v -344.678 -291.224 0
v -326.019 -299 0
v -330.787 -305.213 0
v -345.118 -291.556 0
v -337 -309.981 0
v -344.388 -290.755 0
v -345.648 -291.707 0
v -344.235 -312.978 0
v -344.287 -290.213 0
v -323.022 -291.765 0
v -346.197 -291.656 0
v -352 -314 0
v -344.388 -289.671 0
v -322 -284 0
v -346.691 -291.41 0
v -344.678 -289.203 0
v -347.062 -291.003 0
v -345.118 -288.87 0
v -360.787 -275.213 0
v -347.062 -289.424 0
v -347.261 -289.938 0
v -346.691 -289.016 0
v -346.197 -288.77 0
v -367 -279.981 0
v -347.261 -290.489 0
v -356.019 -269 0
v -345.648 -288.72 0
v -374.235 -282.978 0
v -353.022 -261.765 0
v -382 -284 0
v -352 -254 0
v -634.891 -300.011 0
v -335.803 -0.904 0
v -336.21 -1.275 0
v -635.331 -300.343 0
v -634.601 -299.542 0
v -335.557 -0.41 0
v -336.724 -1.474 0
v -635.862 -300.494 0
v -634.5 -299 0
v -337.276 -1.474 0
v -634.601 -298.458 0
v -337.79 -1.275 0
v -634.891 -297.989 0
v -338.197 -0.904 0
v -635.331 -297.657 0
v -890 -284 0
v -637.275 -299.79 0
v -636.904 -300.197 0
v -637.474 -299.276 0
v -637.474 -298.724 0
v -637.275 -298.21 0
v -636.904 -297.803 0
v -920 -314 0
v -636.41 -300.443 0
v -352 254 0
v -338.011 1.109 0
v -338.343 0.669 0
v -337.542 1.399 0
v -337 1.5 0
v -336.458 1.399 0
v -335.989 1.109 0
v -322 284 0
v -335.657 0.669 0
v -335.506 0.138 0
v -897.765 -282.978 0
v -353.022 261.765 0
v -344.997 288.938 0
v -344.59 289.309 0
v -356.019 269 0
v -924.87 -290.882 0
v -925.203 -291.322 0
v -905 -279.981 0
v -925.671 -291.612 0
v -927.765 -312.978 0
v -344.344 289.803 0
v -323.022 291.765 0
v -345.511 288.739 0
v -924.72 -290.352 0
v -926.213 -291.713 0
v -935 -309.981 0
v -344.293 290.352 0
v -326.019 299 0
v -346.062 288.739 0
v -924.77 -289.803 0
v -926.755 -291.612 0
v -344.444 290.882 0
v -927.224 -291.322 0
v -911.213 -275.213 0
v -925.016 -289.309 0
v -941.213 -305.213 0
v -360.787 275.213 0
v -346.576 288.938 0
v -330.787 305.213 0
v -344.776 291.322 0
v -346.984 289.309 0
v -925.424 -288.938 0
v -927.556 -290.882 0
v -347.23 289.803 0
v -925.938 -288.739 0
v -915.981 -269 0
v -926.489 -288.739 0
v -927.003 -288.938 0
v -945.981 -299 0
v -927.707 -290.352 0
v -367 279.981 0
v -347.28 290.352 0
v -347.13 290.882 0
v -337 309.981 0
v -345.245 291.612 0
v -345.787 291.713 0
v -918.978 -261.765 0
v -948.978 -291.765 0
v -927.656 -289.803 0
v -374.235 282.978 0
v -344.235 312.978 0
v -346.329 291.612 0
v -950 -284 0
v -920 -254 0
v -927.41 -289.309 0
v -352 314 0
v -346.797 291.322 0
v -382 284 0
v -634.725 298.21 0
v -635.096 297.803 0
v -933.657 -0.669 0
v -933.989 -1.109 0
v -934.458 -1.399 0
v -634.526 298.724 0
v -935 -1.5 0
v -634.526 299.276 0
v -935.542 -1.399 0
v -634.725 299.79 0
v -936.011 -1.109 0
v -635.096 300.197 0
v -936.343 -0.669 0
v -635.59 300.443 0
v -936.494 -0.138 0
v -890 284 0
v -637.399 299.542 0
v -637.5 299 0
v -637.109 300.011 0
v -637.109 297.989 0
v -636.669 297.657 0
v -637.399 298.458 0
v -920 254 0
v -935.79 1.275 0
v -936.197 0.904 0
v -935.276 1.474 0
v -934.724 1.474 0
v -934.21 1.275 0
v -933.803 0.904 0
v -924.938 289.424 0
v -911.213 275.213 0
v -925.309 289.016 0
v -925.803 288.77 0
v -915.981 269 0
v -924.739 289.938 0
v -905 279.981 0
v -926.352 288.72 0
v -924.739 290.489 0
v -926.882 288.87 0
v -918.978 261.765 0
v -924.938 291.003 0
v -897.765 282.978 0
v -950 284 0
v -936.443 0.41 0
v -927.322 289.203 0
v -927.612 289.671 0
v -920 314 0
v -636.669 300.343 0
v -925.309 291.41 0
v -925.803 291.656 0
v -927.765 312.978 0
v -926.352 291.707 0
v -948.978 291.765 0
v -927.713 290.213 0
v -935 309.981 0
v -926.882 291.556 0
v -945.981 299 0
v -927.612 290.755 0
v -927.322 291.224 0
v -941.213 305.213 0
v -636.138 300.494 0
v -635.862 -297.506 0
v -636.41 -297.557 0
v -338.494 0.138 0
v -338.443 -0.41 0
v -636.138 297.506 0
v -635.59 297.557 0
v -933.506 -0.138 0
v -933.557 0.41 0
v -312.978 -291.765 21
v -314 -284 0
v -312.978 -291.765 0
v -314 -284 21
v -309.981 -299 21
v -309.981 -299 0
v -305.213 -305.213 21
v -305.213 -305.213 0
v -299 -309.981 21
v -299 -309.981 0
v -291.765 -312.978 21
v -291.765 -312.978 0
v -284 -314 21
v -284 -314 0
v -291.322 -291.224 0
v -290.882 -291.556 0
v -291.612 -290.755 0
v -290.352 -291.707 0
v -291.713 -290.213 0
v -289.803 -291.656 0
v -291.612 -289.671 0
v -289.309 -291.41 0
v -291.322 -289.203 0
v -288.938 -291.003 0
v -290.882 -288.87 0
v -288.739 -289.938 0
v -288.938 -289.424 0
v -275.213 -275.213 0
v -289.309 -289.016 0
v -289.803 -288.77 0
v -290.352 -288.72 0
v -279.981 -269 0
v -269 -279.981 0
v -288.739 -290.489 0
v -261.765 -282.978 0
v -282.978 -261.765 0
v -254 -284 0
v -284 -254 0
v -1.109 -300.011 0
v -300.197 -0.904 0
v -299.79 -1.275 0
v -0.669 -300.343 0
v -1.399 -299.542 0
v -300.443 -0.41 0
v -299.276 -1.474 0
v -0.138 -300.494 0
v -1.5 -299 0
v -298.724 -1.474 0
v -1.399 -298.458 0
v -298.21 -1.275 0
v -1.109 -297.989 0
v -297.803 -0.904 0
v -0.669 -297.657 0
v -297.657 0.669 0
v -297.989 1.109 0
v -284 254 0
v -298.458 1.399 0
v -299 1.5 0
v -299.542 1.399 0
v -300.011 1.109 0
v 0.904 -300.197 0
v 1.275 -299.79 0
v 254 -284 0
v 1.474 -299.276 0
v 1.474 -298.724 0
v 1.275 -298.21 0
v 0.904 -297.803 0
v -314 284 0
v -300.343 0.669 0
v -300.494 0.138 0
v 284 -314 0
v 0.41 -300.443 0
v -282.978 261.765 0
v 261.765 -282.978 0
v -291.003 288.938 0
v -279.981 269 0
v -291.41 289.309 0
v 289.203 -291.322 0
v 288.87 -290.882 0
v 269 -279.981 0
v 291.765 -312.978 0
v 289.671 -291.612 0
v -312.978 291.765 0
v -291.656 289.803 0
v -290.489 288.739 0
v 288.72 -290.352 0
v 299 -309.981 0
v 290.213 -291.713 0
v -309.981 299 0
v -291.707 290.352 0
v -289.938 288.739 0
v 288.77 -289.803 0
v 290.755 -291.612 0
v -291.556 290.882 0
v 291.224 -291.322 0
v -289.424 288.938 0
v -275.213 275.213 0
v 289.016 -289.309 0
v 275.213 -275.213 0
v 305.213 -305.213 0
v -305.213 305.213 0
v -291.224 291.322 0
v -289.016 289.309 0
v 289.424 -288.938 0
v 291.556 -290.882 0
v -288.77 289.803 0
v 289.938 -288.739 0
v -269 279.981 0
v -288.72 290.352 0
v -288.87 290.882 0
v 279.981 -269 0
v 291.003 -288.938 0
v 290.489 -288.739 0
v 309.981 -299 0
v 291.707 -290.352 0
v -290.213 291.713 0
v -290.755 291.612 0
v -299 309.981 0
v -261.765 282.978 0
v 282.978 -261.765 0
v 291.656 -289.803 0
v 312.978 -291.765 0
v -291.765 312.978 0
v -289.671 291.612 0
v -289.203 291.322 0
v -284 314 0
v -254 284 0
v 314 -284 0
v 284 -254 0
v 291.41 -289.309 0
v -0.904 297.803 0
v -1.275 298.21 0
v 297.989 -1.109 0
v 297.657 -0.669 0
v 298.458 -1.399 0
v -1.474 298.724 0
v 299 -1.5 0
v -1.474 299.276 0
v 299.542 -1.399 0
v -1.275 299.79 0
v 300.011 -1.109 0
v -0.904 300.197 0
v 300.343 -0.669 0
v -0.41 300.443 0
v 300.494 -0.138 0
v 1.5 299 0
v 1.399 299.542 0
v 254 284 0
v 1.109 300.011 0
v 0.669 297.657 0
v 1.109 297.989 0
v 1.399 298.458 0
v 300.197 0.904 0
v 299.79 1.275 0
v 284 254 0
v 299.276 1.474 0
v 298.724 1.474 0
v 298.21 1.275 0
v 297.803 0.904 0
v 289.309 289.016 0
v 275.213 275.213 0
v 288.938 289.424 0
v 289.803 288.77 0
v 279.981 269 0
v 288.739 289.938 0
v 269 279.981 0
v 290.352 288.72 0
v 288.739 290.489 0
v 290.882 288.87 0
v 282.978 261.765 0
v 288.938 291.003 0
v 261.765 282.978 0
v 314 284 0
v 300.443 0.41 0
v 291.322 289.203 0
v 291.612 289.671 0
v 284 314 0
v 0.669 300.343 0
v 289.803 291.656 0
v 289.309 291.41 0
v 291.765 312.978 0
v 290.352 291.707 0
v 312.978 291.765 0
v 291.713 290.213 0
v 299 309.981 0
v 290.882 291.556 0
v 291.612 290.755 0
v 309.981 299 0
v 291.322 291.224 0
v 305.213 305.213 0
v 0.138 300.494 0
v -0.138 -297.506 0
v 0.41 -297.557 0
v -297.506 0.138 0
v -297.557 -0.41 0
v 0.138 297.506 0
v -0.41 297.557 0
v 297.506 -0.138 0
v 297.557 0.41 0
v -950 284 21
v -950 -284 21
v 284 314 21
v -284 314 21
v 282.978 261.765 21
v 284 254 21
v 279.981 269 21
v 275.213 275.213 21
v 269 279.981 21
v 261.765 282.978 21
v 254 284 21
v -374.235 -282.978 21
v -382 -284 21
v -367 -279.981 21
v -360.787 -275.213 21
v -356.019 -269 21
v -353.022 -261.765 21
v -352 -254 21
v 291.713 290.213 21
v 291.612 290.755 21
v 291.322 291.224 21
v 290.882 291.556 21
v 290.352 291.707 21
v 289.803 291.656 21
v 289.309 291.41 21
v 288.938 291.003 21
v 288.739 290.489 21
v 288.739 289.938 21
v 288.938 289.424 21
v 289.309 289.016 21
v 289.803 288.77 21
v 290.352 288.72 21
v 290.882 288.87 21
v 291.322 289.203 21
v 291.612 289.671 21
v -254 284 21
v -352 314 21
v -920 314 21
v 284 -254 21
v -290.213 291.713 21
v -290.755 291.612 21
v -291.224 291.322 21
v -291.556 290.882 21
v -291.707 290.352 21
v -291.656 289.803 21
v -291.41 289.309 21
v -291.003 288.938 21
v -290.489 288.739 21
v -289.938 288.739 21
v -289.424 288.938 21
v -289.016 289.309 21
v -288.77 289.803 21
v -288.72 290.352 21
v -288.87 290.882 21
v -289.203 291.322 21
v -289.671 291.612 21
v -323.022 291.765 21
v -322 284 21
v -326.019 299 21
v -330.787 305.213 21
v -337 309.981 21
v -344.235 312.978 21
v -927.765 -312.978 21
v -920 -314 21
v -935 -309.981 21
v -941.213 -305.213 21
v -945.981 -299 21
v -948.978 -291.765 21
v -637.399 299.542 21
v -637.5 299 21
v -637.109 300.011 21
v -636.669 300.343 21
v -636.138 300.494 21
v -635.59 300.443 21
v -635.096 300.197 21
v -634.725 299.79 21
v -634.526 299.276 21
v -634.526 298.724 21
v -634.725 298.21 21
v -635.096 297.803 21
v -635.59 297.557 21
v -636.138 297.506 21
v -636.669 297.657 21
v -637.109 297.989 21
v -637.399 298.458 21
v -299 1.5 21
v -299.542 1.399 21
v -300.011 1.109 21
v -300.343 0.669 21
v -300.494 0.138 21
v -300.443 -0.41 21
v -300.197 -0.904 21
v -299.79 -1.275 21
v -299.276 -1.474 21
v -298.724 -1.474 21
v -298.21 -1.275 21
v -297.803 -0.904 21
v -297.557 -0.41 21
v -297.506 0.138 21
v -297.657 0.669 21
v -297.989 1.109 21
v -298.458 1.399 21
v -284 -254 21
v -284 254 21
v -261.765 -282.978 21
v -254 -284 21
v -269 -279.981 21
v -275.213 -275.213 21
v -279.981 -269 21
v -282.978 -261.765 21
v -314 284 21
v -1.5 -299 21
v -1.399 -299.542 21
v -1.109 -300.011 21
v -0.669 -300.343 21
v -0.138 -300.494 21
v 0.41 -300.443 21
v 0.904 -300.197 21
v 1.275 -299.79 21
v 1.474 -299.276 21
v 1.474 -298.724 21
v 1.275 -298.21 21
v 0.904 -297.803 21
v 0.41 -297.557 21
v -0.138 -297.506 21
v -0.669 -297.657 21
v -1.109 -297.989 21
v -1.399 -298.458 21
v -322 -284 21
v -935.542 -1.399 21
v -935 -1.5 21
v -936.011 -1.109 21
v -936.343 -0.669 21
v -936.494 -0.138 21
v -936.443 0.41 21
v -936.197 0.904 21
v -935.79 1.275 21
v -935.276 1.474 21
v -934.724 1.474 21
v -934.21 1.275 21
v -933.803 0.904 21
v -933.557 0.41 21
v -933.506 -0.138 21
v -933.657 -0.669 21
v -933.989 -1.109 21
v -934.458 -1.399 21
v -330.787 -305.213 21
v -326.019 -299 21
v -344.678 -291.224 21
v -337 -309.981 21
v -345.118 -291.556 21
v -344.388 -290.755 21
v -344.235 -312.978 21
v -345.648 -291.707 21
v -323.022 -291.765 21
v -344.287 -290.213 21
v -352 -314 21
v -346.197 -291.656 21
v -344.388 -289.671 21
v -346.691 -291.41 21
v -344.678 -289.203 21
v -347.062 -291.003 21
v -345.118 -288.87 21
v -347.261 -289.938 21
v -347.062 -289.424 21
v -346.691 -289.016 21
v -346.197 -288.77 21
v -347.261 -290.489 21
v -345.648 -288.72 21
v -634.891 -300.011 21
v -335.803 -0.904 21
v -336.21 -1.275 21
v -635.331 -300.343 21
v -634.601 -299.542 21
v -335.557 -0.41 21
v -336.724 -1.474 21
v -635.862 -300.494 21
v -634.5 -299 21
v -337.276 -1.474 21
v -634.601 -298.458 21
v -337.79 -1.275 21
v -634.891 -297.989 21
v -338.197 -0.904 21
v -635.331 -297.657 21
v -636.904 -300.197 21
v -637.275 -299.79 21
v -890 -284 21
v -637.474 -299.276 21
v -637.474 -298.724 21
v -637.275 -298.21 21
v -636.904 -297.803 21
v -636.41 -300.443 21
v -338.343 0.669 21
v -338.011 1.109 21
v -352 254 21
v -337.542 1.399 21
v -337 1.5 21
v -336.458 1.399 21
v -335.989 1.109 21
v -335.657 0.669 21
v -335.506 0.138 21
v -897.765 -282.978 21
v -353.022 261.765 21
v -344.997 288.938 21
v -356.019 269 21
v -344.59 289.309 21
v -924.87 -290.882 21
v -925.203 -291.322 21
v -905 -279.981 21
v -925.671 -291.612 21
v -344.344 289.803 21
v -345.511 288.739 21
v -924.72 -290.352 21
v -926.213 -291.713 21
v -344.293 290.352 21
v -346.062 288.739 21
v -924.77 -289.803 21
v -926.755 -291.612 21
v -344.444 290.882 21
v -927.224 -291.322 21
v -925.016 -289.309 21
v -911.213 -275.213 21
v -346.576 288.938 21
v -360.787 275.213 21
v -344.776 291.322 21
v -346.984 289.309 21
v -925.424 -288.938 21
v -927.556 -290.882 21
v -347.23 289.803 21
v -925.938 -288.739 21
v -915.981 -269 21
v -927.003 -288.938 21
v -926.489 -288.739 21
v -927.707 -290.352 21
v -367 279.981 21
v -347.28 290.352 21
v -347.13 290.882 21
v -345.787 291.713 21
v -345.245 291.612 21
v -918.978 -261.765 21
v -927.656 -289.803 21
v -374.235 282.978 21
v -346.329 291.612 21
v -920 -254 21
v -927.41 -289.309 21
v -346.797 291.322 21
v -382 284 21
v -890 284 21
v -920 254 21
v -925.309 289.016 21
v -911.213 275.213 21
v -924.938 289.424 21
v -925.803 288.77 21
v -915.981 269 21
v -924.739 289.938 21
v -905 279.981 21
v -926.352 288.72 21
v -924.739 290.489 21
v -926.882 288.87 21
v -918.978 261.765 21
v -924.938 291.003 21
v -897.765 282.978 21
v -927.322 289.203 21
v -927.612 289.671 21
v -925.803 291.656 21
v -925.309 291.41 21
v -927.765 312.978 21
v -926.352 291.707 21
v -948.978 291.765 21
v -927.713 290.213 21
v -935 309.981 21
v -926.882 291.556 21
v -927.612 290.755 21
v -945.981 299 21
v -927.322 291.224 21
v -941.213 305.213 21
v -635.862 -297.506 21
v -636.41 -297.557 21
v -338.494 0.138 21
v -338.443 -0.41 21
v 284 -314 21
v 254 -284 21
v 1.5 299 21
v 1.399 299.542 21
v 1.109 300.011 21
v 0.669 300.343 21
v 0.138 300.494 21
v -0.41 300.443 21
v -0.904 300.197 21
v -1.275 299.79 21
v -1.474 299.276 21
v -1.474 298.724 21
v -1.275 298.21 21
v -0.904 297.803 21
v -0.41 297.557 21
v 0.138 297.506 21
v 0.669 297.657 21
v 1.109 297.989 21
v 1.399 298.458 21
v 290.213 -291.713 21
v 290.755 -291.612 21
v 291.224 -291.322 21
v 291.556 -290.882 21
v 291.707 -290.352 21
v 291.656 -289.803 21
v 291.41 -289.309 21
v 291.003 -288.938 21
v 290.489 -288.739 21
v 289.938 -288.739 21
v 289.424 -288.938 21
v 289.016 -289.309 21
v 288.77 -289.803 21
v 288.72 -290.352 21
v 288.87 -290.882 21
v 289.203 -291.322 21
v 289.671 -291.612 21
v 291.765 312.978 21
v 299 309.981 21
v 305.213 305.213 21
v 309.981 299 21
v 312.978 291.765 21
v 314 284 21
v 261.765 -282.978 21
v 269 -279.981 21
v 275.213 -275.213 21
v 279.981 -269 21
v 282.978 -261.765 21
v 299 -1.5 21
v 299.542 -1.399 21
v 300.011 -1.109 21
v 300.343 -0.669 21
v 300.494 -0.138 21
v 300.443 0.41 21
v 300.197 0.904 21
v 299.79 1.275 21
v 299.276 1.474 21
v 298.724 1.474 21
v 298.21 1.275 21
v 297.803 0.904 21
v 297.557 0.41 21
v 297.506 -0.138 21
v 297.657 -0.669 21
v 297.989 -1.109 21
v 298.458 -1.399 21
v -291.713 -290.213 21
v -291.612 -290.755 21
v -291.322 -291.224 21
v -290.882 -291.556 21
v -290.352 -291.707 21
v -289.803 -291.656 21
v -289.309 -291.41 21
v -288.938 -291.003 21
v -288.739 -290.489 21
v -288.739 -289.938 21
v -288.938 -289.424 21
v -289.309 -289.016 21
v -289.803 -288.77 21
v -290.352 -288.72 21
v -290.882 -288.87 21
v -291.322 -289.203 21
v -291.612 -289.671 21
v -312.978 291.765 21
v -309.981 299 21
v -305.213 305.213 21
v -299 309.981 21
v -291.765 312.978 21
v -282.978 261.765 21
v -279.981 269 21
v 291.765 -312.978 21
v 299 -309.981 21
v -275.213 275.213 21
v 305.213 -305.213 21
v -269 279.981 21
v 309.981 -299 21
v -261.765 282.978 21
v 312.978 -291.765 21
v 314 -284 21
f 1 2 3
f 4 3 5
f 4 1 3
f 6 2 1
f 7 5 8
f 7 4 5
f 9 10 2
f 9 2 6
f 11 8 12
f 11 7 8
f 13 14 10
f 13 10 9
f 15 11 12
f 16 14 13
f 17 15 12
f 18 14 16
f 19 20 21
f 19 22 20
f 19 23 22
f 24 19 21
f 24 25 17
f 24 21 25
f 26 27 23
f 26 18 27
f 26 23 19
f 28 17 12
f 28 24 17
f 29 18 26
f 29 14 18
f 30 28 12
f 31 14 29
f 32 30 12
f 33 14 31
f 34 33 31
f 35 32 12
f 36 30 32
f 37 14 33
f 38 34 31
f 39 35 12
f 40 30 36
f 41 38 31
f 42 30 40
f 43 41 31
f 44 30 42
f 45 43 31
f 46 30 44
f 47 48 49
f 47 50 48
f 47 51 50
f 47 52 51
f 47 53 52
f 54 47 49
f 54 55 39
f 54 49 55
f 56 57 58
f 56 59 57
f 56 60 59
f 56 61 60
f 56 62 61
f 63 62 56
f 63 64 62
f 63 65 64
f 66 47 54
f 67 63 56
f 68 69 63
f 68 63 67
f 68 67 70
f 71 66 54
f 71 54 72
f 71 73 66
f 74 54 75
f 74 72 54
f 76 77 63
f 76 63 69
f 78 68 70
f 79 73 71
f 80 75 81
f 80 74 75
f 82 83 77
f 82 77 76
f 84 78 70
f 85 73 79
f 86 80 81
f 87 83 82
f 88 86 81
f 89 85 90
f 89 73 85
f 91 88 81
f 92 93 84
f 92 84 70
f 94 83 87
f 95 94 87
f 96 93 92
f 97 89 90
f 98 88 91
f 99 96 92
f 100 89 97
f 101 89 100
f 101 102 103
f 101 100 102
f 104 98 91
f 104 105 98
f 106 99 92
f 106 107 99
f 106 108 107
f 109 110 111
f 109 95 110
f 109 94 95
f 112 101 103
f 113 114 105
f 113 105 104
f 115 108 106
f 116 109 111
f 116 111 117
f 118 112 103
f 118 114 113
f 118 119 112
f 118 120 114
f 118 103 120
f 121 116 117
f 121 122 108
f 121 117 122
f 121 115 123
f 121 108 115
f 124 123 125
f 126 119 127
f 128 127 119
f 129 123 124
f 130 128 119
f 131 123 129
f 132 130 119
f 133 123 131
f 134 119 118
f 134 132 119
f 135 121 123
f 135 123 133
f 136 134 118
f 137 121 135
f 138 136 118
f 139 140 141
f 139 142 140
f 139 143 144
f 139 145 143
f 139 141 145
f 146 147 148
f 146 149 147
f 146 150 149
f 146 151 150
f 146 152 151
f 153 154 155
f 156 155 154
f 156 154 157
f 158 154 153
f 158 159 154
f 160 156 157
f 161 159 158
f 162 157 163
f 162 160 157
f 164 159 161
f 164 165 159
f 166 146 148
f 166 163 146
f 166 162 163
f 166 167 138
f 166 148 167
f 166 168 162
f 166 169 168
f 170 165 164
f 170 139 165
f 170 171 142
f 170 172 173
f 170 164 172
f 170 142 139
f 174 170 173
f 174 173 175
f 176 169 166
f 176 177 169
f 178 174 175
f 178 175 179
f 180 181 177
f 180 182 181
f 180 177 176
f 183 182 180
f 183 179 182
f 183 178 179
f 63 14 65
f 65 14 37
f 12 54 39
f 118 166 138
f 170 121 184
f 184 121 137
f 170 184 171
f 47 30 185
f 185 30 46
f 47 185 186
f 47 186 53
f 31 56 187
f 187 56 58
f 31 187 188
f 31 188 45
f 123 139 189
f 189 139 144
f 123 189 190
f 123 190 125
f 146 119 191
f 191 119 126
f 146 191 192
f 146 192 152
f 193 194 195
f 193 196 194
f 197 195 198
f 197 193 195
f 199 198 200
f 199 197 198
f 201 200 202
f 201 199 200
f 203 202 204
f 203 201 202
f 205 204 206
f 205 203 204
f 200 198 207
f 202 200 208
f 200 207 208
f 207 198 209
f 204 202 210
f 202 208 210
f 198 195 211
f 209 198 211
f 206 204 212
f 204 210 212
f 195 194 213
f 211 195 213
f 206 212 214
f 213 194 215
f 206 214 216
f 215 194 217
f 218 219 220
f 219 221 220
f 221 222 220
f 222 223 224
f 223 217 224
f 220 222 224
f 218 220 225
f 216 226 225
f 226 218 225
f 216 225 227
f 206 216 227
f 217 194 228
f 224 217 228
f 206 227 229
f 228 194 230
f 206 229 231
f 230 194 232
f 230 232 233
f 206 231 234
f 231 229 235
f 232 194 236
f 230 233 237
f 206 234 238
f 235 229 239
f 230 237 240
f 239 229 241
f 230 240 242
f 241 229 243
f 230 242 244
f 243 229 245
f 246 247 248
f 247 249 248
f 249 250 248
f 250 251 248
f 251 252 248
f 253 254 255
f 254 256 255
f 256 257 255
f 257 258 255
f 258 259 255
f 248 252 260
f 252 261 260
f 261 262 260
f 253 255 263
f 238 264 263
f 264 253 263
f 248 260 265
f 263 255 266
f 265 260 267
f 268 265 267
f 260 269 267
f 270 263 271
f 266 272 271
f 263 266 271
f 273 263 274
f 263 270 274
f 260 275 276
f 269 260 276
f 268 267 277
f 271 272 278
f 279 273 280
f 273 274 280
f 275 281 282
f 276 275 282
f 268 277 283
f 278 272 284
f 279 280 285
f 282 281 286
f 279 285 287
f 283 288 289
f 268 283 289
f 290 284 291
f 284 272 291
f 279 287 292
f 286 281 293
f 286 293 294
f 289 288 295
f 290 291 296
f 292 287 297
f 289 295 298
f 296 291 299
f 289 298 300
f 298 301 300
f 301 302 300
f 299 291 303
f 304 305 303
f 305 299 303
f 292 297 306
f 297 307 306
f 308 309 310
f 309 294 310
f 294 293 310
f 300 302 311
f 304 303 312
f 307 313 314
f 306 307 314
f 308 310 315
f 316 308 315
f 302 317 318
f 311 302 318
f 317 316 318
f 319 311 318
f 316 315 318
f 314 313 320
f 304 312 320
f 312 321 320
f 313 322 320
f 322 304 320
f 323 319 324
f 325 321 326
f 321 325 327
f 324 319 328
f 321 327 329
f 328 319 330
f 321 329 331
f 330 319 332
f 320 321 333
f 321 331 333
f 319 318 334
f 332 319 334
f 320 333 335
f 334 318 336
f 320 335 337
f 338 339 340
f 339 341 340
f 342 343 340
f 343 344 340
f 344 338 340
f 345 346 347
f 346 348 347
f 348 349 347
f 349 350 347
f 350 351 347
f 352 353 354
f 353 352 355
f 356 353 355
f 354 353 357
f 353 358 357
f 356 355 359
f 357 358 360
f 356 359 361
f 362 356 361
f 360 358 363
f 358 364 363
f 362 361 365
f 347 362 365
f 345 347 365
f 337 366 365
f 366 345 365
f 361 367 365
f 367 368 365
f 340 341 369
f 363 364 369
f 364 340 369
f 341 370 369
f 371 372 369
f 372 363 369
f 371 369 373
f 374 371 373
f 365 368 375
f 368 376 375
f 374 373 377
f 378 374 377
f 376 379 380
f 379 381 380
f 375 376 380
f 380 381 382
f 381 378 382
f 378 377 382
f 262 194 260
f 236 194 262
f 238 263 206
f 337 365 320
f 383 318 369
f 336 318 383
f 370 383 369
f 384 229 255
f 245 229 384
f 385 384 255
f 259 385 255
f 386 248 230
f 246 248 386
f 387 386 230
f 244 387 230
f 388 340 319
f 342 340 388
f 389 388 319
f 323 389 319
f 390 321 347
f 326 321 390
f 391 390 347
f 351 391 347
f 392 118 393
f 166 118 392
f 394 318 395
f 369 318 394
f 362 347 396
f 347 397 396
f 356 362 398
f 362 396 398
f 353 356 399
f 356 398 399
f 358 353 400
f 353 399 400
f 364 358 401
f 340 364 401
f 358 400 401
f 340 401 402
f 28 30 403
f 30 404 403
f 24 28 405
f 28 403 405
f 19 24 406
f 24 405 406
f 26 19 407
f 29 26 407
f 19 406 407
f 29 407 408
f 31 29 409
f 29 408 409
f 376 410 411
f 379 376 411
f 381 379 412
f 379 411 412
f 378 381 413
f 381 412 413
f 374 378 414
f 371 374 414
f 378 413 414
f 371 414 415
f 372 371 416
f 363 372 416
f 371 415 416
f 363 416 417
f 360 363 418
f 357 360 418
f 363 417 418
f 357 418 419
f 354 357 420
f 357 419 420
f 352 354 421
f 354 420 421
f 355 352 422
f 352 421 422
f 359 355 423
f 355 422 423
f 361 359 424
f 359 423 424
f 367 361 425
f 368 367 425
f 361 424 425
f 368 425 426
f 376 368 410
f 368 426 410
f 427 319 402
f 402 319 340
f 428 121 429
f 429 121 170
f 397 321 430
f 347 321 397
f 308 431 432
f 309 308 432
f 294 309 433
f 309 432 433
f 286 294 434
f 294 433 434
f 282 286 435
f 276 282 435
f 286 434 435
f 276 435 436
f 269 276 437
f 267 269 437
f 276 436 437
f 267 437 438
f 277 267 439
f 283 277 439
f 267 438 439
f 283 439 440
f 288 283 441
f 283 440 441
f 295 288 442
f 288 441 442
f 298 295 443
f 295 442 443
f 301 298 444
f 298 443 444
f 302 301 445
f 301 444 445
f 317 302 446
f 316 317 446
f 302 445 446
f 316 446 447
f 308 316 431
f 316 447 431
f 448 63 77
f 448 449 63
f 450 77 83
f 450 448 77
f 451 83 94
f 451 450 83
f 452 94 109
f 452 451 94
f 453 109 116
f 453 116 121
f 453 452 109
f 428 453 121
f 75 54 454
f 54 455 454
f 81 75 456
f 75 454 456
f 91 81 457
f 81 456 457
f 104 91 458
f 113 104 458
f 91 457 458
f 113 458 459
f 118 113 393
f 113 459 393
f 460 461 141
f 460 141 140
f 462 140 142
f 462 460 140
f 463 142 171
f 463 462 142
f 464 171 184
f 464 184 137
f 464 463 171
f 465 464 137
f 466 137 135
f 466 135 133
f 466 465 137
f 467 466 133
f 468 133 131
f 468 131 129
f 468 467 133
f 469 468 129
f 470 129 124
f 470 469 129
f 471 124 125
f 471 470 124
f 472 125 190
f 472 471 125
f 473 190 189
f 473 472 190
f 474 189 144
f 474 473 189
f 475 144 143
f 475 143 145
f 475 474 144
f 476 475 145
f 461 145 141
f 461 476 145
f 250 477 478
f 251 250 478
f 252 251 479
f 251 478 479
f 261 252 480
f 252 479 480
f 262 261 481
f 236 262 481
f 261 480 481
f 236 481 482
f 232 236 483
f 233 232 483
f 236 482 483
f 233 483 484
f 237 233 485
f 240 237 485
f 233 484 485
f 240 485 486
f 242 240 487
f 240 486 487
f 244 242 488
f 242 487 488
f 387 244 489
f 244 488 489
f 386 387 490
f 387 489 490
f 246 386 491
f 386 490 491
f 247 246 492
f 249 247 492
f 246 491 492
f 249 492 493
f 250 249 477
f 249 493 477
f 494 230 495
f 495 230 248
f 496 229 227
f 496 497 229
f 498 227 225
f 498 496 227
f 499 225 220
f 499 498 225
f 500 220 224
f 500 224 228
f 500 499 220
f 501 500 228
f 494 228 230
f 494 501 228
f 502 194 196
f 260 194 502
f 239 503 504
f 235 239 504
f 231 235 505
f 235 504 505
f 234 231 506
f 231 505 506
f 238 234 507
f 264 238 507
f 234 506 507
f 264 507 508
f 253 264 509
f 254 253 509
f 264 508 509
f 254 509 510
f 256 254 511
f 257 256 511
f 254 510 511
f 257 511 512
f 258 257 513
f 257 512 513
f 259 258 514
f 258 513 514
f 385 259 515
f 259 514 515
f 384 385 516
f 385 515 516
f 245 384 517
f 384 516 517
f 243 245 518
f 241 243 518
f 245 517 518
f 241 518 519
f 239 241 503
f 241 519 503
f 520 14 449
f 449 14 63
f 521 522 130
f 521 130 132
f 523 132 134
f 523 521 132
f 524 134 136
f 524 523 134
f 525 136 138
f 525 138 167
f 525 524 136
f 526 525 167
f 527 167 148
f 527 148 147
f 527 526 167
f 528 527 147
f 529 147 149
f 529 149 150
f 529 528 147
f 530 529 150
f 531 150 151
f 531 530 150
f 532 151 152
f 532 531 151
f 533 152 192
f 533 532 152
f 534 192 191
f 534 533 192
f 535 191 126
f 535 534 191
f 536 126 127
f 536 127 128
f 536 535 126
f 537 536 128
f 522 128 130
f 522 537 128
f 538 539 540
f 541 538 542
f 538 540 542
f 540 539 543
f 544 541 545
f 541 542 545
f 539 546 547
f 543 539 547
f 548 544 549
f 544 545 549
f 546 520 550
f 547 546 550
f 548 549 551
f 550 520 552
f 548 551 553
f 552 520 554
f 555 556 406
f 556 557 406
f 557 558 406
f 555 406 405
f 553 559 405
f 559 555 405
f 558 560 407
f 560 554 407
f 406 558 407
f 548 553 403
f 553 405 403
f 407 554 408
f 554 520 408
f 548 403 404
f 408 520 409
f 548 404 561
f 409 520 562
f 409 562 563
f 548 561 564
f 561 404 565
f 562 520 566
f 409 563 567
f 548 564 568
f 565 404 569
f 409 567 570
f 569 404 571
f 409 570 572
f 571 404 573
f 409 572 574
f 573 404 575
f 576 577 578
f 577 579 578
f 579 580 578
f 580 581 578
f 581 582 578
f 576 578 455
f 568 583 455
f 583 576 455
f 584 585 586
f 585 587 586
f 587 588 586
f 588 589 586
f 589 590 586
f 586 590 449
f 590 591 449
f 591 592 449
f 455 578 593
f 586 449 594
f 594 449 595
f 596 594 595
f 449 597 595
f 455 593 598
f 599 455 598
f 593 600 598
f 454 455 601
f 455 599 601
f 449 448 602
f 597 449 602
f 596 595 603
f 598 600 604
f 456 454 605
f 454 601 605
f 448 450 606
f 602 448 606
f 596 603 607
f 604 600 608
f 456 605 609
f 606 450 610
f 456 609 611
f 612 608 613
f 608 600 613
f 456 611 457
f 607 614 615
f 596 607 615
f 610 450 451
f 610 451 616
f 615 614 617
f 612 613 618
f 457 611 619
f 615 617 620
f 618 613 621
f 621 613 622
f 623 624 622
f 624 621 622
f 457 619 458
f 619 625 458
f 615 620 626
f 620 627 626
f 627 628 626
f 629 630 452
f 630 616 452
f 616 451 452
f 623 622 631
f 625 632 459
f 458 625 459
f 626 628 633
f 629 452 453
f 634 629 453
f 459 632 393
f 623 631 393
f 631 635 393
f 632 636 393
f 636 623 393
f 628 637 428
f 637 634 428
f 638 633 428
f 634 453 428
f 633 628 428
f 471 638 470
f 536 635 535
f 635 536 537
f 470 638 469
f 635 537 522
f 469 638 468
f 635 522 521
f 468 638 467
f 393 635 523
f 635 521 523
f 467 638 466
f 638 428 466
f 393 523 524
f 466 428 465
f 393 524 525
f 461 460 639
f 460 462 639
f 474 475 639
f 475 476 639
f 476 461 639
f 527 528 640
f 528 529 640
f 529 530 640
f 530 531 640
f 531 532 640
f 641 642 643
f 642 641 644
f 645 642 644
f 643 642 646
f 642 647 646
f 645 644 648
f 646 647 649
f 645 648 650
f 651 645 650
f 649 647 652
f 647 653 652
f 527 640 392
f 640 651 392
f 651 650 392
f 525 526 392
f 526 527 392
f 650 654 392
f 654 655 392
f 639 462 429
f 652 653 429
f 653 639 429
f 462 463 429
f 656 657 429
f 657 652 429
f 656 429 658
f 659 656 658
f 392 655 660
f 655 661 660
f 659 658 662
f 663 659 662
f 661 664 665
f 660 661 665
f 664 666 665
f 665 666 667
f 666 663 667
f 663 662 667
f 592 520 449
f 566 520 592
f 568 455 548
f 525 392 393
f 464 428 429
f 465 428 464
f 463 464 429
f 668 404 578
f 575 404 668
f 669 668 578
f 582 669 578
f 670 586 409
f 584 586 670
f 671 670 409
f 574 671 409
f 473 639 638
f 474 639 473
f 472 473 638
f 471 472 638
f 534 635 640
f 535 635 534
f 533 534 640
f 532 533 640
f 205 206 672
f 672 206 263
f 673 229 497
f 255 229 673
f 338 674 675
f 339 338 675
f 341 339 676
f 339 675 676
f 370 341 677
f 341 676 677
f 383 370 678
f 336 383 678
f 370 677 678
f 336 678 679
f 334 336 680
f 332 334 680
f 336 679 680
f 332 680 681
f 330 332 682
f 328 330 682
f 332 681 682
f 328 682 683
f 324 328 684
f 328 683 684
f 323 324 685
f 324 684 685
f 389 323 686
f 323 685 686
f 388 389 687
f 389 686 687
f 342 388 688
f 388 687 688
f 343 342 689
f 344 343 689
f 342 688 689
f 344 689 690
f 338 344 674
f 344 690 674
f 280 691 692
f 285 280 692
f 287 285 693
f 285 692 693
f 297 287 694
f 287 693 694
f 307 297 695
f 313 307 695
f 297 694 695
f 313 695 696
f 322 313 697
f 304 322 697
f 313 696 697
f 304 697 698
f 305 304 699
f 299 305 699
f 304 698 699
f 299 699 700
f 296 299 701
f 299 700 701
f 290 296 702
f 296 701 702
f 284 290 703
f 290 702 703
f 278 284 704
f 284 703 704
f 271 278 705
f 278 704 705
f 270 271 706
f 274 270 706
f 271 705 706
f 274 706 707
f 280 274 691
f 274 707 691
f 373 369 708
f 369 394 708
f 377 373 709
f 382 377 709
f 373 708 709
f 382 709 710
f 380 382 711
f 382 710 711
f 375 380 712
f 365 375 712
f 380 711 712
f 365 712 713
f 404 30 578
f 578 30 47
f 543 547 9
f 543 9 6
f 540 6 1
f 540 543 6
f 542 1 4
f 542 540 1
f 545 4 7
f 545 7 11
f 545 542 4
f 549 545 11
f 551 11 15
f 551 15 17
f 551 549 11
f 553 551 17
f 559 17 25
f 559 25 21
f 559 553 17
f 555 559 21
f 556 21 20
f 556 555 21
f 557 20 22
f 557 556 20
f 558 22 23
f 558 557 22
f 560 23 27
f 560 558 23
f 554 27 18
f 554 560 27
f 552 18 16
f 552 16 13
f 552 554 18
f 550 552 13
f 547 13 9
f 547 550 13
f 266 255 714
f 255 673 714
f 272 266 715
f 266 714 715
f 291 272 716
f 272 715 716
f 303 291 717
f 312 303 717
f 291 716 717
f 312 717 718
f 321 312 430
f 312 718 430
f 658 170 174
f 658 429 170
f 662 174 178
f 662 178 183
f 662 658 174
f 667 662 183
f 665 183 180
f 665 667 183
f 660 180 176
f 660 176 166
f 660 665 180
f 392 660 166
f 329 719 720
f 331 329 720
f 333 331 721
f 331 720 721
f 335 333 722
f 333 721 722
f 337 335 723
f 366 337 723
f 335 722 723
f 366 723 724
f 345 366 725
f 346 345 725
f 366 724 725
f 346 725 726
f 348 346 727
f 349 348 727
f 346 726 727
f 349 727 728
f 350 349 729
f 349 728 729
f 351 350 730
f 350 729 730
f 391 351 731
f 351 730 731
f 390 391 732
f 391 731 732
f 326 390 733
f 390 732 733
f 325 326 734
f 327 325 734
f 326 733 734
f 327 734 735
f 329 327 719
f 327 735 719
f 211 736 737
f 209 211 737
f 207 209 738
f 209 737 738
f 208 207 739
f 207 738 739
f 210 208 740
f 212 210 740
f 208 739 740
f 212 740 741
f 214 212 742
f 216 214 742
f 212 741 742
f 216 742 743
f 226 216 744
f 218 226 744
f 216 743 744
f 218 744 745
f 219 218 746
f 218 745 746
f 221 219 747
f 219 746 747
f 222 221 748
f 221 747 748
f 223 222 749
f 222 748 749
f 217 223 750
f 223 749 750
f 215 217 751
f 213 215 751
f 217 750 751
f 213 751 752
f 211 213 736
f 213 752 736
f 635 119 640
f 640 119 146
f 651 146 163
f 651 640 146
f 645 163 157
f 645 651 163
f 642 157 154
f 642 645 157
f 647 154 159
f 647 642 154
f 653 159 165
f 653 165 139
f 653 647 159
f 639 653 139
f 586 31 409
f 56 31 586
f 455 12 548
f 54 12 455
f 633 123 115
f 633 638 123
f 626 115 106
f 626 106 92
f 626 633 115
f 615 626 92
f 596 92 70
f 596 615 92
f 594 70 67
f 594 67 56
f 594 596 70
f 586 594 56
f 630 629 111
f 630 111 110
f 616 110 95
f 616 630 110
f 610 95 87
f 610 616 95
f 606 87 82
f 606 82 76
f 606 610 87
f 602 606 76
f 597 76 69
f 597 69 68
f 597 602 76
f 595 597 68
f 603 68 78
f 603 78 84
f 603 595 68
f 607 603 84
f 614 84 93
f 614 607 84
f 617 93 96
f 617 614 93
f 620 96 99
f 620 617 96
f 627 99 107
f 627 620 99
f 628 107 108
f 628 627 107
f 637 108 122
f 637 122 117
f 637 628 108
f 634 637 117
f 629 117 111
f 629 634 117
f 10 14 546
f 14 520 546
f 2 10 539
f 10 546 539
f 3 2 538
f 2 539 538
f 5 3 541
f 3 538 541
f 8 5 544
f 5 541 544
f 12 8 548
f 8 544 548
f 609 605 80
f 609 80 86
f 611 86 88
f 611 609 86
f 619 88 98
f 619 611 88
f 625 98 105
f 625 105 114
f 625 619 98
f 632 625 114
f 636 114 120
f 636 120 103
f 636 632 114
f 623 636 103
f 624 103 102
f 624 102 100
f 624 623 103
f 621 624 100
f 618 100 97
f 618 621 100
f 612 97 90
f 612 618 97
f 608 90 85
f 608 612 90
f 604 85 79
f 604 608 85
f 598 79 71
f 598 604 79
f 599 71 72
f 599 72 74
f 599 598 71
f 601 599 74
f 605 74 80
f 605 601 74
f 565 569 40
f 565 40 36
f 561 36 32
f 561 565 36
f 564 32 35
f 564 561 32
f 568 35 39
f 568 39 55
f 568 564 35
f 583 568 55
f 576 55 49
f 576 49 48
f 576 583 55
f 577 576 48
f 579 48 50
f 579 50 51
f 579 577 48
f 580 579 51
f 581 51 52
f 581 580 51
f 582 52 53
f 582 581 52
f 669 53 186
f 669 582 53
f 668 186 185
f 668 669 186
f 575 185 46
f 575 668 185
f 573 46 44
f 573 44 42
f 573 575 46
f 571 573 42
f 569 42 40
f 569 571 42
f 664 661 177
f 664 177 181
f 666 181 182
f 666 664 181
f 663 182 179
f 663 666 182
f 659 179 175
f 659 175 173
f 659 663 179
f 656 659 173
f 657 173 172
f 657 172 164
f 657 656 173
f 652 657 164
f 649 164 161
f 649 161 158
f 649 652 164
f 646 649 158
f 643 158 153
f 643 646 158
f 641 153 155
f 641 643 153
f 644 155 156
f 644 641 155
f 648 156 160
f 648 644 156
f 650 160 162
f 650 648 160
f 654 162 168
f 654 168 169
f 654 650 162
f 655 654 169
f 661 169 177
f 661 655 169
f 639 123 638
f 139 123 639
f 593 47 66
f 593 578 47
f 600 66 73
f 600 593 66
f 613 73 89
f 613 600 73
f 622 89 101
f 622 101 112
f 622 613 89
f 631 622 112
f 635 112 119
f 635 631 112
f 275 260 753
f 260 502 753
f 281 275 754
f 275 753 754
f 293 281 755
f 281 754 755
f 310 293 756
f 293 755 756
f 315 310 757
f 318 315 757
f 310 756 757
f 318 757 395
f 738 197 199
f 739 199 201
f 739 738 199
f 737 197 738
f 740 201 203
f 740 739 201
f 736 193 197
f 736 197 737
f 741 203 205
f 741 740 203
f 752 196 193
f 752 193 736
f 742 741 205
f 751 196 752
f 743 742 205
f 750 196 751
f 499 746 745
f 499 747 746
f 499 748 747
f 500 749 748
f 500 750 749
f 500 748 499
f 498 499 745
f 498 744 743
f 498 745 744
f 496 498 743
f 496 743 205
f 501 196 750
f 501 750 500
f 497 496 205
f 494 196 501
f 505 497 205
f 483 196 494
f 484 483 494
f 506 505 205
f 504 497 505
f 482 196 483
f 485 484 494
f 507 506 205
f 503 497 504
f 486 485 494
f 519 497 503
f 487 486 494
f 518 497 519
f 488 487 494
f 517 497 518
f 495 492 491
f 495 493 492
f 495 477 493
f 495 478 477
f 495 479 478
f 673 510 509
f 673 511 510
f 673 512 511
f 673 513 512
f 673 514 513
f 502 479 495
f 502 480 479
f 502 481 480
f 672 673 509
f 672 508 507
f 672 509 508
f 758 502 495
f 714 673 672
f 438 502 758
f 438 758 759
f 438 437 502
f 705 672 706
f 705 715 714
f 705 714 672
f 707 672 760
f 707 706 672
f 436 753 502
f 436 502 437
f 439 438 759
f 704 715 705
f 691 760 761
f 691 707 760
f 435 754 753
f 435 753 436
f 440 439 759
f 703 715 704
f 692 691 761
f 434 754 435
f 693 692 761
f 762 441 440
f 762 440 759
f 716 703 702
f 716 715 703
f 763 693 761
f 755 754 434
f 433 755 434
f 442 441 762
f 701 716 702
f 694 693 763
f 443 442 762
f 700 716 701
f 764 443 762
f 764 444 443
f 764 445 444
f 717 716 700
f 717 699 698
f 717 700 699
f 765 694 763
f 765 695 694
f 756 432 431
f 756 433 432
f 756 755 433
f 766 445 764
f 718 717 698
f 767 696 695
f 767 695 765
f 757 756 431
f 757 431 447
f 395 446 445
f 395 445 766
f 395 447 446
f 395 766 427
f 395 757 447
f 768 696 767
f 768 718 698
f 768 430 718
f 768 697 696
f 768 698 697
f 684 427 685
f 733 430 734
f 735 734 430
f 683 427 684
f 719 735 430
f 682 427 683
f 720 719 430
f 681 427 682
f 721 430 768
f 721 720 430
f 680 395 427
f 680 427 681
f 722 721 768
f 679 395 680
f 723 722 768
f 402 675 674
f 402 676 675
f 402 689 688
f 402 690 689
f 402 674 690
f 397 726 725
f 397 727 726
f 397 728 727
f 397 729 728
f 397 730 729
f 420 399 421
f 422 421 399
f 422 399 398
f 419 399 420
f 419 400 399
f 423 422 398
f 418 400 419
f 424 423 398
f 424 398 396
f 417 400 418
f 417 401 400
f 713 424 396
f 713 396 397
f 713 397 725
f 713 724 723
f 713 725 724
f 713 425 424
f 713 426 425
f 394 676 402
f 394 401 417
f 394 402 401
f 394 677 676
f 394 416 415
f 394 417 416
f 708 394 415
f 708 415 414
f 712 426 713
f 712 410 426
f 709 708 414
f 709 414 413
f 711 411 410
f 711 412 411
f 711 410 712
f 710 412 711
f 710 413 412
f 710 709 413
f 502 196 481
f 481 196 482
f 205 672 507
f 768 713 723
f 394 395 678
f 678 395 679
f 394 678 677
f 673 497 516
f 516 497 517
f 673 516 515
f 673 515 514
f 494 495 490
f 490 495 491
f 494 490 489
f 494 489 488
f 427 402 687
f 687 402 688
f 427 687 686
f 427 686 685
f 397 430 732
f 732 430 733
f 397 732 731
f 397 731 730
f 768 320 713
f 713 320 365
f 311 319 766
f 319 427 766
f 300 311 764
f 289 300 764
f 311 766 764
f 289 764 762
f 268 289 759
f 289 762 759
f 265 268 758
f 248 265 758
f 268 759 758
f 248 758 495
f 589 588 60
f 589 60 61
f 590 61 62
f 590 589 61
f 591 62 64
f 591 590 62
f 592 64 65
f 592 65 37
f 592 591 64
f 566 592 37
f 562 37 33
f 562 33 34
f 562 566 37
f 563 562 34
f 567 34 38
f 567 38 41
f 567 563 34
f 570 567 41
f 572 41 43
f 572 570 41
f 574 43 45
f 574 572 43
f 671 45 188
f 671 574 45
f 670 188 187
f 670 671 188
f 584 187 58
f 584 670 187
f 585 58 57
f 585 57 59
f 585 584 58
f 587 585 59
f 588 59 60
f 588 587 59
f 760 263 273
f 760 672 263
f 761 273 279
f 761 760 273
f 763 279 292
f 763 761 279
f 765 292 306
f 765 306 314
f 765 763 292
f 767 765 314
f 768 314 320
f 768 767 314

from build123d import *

# Parameters (mm, degrees)
F0_W            = 628
F0_H            = 628
F0_W_2          = 568
F0_H_2          = 568
F1_DEPTH        = 21
F2_R            = 30
F3_R            = 30
F6_R            = 1.5
F7_DEPTH        = 21.001
F7_COPIES_COUNT = 4


# Not quite as in the source:
# - a pattern or mirror of a feature is missing from the dataset's text; its kind, count and spacing are read off the source's solid


with BuildPart() as f1:
    # F0 (on Top) → F1 (new body)
    with BuildSketch(Plane.XY):
        Rectangle(F0_W, F0_H)
        Rectangle(F0_W_2, F0_H_2, mode=Mode.SUBTRACT)
    extrude(amount=F1_DEPTH)

    # F2
    f2_edges = [f1.edges().sort_by_distance(p)[0] for p in [
        (-284, 284, 10.5),
        (284, 284, 10.5),
        (284, -284, 10.5),
        (-284, -284, 10.5),
    ]]
    fillet(f2_edges, radius=F2_R)

    # F3
    f3_edges = [f1.edges().sort_by_distance(p)[0] for p in [
        (-314, -314, 10.5),
        (314, -314, 10.5),
        (314, 314, 10.5),
        (-314, 314, 10.5),
    ]]
    fillet(f3_edges, radius=F3_R)

    # F6 (on face) → F7 (cut, through all)
    with BuildSketch(Plane.XY.offset(21)):
        with Locations((0, 299)):
            Circle(F6_R)
        with Locations((290.2132034356, 290.2132034356)):
            Circle(F6_R)
    f7 = extrude(amount=-F7_DEPTH, mode=Mode.SUBTRACT)

    # F7_copies: F7 ×4 about axis
    f7_copies_axis = Axis((0, 0, 0), (0, 0, 1))
    for i in range(1, F7_COPIES_COUNT):
        add(f7.rotate(f7_copies_axis, i * 360 / F7_COPIES_COUNT), mode=Mode.SUBTRACT)


with BuildPart() as f8_1:
    # F8: instance of F1
    add(f1.part.mirror(Plane(origin=(-318, 0, 10.5), x_dir=(0, -1, 0), z_dir=(-1, 0, 0))))


solid = Compound([f1.part, f8_1.part])
